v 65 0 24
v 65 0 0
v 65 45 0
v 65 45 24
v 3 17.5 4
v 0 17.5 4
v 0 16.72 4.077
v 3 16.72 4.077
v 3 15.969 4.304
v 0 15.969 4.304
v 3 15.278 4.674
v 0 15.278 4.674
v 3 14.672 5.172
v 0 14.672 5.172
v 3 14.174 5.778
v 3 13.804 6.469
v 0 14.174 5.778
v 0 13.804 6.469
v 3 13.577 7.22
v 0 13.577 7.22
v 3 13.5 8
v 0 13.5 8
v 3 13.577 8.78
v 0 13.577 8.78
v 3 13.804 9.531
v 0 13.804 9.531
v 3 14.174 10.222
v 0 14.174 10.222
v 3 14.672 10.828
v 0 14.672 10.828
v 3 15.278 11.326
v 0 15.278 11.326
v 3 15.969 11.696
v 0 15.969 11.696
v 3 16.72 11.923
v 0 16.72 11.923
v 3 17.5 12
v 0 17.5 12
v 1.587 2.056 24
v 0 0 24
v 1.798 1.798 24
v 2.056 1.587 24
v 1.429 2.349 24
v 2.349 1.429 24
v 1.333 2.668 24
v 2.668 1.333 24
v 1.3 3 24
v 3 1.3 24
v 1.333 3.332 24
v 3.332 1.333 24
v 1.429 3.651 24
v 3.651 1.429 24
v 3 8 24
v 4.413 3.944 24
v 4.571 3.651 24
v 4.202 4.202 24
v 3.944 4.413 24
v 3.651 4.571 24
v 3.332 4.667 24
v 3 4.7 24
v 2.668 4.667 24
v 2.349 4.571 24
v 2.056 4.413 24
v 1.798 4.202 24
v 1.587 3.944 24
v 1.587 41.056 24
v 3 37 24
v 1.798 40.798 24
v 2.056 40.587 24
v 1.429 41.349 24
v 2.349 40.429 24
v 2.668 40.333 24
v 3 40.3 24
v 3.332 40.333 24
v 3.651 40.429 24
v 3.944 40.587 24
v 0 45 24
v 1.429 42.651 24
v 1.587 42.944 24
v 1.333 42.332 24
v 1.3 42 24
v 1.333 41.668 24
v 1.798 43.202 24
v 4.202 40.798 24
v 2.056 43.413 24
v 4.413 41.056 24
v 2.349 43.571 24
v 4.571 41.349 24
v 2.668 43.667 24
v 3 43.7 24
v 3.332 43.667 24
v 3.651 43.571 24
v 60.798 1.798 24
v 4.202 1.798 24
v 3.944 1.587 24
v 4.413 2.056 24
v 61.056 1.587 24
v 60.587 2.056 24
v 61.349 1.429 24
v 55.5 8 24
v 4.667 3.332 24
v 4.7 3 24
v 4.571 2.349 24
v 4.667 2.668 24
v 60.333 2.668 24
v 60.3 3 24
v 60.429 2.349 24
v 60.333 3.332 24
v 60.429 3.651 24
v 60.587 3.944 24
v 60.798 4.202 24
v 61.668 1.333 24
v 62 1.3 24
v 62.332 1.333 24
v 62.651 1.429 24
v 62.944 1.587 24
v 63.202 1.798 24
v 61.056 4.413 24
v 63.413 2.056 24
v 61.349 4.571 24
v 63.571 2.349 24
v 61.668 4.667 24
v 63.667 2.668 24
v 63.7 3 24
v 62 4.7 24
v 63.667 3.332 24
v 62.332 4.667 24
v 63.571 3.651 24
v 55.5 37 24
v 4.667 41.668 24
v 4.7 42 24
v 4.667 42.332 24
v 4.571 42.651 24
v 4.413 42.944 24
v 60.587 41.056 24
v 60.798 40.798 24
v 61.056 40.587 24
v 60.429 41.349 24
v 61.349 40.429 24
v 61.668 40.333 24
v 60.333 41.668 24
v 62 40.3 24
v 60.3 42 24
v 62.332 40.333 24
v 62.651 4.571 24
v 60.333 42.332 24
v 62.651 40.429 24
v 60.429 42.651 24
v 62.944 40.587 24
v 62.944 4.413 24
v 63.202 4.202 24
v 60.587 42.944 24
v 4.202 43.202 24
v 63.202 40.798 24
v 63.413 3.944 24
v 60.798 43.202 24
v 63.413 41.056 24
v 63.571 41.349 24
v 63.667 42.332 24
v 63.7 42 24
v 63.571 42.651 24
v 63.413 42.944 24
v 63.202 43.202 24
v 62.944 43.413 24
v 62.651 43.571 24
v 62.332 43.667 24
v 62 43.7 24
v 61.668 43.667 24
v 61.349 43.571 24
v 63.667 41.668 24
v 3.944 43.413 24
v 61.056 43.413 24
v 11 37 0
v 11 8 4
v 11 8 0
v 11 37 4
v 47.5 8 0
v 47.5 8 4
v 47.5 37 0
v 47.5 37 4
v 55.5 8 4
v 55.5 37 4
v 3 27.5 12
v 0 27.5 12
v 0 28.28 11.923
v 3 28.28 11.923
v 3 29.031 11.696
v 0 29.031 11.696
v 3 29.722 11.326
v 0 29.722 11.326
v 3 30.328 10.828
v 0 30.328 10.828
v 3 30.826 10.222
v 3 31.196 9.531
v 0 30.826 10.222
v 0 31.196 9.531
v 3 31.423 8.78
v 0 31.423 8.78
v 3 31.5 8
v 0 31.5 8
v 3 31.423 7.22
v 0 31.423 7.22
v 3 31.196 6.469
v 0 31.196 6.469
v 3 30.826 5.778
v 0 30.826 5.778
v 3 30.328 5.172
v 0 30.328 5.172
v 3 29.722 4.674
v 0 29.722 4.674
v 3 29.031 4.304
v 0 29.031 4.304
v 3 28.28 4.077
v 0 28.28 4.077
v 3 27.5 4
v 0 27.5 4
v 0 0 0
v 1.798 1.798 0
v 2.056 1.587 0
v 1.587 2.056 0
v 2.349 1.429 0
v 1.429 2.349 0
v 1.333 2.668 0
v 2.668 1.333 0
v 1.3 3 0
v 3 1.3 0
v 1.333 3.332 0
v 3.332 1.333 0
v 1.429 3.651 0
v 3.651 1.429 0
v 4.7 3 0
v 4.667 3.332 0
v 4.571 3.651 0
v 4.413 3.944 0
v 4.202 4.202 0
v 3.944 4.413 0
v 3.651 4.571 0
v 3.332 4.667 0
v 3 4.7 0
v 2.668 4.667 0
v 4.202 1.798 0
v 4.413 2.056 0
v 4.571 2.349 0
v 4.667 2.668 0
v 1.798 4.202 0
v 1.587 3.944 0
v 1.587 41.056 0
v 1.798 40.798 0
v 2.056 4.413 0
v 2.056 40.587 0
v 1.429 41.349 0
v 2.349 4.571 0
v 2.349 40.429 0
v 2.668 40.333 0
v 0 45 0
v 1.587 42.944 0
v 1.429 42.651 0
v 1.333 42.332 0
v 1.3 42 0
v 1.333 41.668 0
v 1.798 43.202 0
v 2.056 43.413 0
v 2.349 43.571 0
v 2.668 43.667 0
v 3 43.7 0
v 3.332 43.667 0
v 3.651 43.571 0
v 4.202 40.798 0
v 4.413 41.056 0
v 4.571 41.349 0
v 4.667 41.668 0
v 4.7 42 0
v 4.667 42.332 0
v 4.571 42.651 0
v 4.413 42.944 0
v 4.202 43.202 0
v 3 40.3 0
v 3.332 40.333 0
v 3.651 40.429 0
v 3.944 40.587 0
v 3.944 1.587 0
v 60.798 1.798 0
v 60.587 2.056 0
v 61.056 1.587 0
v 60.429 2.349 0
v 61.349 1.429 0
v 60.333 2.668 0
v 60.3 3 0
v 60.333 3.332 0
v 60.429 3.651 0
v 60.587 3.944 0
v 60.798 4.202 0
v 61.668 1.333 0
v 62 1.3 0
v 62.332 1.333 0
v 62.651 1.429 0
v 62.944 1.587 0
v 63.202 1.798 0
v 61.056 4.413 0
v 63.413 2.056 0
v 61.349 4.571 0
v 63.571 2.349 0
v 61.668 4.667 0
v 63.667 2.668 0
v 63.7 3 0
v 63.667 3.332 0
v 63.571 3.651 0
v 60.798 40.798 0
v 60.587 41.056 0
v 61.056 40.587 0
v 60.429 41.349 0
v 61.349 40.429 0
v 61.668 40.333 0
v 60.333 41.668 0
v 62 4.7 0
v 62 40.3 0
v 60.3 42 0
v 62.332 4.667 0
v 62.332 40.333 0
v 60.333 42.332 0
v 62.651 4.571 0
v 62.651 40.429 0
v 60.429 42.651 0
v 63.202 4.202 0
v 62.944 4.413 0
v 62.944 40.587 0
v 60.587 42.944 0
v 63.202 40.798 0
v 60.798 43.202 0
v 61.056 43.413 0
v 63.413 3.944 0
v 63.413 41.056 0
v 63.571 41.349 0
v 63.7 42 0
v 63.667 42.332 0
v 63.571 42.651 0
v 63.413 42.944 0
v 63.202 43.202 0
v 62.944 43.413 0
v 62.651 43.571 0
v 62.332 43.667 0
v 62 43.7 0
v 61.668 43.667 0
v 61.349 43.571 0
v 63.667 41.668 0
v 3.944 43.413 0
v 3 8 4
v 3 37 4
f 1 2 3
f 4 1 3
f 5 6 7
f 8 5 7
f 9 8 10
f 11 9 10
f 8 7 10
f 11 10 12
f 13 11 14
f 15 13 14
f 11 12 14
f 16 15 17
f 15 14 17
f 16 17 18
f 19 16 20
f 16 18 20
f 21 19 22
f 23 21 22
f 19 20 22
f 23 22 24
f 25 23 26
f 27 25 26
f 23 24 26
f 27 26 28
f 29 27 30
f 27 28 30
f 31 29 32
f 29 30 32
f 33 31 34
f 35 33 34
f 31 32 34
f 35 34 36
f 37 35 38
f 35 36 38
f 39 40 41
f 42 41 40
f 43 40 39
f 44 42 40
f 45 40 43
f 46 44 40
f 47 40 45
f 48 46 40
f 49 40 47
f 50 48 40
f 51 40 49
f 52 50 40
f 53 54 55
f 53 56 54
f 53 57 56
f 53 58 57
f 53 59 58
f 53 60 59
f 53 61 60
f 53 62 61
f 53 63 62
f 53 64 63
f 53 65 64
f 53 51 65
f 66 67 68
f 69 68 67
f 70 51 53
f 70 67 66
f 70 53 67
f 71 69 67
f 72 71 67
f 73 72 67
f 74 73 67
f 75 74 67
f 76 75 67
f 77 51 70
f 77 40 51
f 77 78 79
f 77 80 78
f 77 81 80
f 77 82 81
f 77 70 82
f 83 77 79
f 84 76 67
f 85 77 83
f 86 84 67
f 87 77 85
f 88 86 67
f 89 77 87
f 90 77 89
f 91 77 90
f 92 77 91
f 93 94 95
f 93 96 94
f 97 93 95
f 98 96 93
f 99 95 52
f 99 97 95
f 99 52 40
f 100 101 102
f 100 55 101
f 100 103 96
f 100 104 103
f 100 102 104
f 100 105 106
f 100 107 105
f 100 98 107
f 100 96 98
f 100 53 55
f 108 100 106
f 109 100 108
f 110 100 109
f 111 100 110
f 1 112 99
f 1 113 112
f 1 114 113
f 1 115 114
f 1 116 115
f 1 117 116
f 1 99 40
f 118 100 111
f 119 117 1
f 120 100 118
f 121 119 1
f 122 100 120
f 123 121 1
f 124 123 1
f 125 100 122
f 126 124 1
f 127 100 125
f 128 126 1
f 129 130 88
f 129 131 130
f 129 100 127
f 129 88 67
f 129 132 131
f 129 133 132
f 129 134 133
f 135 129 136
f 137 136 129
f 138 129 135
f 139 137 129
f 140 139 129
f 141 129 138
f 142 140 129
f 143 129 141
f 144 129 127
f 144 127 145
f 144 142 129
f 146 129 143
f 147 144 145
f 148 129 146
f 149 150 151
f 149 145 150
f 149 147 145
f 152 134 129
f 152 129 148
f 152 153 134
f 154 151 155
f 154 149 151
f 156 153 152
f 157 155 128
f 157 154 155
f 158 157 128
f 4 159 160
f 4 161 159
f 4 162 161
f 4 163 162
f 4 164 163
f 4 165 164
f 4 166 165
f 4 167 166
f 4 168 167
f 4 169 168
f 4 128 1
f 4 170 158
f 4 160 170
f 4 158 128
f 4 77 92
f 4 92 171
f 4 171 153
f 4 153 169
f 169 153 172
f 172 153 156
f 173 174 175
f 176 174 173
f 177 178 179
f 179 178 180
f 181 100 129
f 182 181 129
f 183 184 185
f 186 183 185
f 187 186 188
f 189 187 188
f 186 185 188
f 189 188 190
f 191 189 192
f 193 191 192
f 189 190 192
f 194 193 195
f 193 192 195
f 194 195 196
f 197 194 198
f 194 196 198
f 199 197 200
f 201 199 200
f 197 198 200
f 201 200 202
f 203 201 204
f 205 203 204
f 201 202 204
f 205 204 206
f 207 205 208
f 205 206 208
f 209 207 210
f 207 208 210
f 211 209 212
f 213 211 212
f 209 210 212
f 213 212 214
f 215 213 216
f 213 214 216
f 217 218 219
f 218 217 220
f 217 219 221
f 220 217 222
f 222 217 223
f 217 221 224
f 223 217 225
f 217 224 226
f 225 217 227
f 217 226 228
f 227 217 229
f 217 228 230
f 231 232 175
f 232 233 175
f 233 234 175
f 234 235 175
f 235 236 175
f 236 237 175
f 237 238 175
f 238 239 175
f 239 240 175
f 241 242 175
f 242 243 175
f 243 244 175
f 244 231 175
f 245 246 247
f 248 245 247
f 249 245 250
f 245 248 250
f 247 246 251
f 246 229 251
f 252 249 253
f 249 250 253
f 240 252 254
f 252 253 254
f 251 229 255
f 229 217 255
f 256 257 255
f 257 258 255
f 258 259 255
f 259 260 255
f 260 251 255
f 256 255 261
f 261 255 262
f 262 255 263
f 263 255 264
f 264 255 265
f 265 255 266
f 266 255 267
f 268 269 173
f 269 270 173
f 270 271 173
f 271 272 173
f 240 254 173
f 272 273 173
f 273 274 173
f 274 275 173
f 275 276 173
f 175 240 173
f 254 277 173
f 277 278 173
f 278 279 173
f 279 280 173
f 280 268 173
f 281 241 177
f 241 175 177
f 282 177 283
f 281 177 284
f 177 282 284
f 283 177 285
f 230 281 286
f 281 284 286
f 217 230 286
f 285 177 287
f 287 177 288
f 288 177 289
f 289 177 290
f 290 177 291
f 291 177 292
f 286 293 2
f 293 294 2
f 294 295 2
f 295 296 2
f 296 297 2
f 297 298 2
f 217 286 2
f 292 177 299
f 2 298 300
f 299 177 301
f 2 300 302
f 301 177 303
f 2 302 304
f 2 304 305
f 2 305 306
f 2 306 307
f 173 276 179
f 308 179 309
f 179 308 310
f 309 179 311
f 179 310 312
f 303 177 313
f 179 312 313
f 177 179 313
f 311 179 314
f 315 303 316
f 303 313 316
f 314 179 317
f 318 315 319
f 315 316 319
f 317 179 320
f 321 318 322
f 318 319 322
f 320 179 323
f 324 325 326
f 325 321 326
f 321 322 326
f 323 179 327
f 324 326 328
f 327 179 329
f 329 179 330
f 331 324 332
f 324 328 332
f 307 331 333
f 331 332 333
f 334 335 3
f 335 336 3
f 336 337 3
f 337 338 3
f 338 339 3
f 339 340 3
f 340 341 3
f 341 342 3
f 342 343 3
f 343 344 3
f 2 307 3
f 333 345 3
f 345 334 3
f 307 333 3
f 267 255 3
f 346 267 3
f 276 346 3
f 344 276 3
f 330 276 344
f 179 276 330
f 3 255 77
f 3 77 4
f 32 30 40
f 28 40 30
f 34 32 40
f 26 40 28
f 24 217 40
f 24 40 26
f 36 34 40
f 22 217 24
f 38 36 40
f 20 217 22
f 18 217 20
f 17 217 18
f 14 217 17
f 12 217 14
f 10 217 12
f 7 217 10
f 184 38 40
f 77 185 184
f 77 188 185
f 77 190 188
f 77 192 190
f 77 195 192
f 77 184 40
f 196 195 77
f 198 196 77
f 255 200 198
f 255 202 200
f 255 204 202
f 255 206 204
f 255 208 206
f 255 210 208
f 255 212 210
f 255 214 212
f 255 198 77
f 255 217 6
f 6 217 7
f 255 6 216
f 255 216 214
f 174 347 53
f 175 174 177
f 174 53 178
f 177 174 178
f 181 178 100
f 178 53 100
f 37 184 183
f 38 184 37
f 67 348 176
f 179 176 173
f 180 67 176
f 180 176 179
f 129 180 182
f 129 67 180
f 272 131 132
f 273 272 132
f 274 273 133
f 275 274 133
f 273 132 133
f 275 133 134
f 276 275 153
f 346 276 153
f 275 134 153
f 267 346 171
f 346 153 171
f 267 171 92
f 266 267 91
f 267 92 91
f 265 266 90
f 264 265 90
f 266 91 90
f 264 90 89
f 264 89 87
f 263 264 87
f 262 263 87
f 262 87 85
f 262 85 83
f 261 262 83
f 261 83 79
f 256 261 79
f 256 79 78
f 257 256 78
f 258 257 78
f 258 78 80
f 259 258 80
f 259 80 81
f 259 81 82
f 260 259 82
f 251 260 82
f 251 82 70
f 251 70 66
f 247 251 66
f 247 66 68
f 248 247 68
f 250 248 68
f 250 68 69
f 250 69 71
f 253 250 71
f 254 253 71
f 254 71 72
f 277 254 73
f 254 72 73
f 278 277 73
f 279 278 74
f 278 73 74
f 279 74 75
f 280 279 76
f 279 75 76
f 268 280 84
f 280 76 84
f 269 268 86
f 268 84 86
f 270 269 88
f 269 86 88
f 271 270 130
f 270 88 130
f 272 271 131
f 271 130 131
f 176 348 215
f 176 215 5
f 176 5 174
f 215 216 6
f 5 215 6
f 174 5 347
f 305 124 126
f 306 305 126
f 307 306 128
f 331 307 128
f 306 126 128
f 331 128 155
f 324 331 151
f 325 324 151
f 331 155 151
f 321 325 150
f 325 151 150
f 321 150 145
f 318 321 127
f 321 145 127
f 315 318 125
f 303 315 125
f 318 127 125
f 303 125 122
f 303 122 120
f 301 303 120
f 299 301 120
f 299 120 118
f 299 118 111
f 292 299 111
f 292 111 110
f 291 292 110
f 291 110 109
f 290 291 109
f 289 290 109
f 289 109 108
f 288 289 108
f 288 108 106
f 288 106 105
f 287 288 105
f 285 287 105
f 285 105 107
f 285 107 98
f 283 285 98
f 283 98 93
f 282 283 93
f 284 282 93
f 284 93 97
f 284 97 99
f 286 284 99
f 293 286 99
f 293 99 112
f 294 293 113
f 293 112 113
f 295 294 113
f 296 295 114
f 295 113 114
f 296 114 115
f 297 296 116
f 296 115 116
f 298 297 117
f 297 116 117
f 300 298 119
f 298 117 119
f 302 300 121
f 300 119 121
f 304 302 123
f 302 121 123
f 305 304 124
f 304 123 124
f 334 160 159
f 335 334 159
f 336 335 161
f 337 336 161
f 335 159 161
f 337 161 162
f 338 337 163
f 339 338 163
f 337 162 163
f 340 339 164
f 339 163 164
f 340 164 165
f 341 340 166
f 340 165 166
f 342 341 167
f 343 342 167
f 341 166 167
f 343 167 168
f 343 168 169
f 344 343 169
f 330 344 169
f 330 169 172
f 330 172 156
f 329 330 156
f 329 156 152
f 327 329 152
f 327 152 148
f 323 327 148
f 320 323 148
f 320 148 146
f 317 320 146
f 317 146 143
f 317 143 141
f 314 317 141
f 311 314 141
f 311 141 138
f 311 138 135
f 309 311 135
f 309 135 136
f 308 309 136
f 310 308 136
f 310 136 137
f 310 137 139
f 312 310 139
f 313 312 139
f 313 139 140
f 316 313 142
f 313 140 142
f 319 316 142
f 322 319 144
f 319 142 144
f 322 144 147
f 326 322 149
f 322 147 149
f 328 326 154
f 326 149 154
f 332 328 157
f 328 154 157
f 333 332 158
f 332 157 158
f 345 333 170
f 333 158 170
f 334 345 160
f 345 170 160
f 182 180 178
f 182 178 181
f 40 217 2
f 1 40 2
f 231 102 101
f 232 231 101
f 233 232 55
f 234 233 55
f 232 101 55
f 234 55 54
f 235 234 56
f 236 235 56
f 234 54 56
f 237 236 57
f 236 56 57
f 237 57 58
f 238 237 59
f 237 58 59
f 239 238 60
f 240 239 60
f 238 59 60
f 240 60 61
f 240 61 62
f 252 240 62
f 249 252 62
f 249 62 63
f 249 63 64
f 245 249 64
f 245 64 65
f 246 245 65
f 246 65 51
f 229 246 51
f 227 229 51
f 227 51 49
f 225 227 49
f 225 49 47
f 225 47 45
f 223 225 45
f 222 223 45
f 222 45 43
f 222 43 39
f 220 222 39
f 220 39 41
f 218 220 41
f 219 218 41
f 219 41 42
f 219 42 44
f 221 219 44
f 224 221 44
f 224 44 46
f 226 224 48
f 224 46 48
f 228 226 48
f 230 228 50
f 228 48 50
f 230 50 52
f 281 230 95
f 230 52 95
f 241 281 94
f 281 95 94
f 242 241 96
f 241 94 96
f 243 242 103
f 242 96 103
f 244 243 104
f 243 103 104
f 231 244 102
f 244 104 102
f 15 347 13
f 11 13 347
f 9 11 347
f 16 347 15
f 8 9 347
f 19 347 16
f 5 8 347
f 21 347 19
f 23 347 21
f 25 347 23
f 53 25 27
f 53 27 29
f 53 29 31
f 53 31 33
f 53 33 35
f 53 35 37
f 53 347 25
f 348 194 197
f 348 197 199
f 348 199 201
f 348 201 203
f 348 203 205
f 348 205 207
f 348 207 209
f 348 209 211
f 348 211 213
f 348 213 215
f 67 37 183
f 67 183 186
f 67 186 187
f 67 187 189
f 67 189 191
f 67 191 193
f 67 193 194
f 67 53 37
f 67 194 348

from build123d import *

# Parameters (mm, degrees)
SKETCH_W        = 65
SKETCH_H        = 45
PAD_DEPTH       = 24
SKETCH001_W     = 52.5
SKETCH001_H     = 29
POCKET_DEPTH    = 20
SKETCH002_R     = 1.7
SKETCH002_W     = 36.5
SKETCH002_H     = 29
POCKET001_DEPTH = 24.001
POCKET002_DEPTH = 3


with BuildPart() as part:
    # Sketch → Pad (new body)
    with BuildSketch(Plane.XY):
        with Locations((32.5, 22.5)):
            Rectangle(SKETCH_W, SKETCH_H)
    extrude(amount=PAD_DEPTH)

    # Sketch001 (on Face6 of Pad) → Pocket (cut)
    with BuildSketch(Plane.XY.offset(24)):
        with Locations((29.25, 22.5)):
            Rectangle(SKETCH001_W, SKETCH001_H)
    extrude(amount=-POCKET_DEPTH, mode=Mode.SUBTRACT)

    # Sketch002 (on Face5 of Pocket) → Pocket001 (cut, through all)
    with BuildSketch(Plane.XY.offset(24)):
        with Locations((3, 42)):
            Circle(SKETCH002_R)
        with Locations((62, 42)):
            Circle(SKETCH002_R)
        with Locations((62, 3)):
            Circle(SKETCH002_R)
        with Locations((3, 3)):
            Circle(SKETCH002_R)
        with Locations((29.25, 22.5)):
            Rectangle(SKETCH002_W, SKETCH002_H)
    extrude(amount=-POCKET001_DEPTH, mode=Mode.SUBTRACT)

    # Sketch003 (on Face2 of Pocket001) → Pocket002 (cut)
    with BuildSketch(Plane(origin=(0, 0, 0), x_dir=(0, -1, 0), z_dir=(-1, 0, 0))):
        with BuildLine():
            ThreePointArc((-27.5, 12), (-31.5, 8), (-27.5, 4))
            Line((-27.5, 4), (-17.5, 4))
            ThreePointArc((-17.5, 4), (-13.5, 8), (-17.5, 12))
            Line((-27.5, 12), (-17.5, 12))
        make_face()
    extrude(amount=-POCKET002_DEPTH, mode=Mode.SUBTRACT)


solid = part.part
